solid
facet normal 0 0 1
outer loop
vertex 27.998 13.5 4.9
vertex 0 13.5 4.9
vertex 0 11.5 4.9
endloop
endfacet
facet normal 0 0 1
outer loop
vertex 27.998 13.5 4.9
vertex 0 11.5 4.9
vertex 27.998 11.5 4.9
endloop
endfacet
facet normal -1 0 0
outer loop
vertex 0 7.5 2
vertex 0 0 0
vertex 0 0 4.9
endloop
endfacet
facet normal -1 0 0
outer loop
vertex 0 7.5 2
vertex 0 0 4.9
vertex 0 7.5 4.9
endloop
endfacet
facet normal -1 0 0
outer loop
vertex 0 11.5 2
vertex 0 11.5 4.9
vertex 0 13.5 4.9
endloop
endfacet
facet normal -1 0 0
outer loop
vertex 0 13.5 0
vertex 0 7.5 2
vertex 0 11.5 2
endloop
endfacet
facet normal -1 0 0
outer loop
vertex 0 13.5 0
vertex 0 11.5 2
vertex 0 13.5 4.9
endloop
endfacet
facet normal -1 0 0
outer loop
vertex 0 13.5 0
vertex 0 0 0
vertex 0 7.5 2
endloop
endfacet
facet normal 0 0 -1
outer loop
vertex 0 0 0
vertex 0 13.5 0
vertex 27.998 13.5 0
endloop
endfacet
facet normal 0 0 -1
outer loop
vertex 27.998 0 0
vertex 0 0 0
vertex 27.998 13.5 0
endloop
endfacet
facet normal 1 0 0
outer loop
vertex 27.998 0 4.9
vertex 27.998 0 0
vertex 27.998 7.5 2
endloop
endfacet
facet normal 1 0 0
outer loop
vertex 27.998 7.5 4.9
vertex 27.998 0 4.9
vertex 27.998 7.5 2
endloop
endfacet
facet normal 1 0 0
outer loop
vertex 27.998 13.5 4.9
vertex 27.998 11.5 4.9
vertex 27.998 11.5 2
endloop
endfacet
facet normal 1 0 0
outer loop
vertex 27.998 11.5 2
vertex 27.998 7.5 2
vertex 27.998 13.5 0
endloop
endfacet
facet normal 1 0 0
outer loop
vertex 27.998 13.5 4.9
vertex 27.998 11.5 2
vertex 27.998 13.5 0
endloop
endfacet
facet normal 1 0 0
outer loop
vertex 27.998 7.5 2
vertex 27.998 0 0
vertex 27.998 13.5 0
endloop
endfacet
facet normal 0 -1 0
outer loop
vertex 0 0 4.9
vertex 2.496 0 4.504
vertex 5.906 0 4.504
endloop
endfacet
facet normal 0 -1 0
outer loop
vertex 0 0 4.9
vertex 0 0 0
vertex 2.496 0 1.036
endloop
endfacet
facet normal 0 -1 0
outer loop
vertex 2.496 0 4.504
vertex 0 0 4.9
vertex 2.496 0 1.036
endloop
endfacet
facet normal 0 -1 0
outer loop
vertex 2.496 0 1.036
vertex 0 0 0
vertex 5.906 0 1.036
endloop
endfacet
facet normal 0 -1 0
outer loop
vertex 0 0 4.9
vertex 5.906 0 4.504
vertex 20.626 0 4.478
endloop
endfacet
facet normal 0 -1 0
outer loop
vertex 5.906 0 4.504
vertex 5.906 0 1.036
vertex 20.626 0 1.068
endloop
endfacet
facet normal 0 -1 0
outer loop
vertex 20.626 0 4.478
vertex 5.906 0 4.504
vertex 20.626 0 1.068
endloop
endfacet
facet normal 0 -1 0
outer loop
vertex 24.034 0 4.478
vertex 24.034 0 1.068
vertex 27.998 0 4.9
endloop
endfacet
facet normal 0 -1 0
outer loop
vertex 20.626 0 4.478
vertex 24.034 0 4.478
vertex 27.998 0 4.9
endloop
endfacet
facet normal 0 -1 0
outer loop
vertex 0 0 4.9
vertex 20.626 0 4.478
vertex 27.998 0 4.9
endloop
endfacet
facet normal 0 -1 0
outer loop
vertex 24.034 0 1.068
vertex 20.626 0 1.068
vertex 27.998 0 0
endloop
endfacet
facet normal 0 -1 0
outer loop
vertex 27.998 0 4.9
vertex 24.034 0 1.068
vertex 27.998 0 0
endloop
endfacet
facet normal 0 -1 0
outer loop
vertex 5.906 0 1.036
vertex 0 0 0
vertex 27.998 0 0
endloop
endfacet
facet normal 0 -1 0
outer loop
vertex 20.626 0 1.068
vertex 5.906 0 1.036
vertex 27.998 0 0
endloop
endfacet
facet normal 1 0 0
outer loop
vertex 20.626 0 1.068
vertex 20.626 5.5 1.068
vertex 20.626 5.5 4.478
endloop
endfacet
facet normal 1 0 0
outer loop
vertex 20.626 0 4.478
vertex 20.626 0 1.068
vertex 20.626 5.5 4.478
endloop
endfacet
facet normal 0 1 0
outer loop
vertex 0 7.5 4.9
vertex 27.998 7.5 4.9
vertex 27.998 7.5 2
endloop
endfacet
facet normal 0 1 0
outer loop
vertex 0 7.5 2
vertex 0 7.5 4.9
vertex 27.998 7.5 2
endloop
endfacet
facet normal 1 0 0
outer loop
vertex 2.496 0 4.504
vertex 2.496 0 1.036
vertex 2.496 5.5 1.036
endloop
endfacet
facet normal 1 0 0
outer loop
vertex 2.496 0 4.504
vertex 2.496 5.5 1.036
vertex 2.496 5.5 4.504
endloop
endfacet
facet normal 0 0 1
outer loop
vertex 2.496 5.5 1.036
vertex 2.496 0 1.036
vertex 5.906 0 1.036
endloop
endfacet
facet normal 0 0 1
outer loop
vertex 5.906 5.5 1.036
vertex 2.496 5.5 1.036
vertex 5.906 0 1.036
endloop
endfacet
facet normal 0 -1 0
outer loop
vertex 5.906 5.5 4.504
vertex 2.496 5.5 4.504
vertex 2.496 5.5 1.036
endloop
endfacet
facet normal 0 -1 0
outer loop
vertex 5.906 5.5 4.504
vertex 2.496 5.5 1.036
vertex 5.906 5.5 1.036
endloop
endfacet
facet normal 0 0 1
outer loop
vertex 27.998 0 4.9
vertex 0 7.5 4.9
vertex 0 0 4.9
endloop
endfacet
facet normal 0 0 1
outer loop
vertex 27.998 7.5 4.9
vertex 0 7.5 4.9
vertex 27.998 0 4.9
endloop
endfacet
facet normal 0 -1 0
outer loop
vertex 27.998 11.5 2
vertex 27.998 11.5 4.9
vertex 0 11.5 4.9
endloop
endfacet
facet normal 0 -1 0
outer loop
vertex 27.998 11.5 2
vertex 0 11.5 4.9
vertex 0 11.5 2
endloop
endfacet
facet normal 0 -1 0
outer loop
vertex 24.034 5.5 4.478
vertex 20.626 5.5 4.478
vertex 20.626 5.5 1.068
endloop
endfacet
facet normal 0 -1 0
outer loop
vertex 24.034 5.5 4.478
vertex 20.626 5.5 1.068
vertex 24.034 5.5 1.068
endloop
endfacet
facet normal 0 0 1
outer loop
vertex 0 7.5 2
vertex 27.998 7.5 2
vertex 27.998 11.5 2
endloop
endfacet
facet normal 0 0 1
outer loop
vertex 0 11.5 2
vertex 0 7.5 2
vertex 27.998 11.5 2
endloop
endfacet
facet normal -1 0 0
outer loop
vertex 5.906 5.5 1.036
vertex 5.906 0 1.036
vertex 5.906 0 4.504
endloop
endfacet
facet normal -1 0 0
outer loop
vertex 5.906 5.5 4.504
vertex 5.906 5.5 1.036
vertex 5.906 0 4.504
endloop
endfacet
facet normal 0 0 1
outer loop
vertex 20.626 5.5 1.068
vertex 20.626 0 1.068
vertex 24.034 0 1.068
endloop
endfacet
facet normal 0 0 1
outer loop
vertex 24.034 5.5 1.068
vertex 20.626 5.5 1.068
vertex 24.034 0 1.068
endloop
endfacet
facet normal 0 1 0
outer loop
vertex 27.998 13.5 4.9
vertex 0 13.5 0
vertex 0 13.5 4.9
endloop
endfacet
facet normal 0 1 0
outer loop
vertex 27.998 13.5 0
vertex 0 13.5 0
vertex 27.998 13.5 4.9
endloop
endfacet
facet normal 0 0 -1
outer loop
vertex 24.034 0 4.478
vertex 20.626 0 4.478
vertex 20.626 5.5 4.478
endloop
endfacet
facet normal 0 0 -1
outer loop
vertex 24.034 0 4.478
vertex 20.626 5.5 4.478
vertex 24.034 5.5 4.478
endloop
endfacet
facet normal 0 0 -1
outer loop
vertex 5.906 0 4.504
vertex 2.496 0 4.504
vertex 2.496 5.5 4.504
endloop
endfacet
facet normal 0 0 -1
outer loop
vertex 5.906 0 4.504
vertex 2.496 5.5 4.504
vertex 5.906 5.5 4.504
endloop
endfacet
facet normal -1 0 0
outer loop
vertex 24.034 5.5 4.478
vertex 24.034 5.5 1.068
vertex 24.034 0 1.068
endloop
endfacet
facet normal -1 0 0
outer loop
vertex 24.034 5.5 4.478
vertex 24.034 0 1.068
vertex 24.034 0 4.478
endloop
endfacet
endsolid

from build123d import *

# Parameters (mm, degrees)
SKETCH1_W           = 27.99800038
SKETCH1_H           = 15
BOSS_EXTRUDE1_DEPTH = 4.9
SKETCH3_W           = 3.40799886
SKETCH3_H           = 3.410000155
SKETCH3_W_2         = 2.90799886
SKETCH3_H_2         = 2.910000155
SKETCH3_W_3         = 3.409995615
SKETCH3_H_3         = 3.468000248
SKETCH3_W_4         = 2.909995615
SKETCH3_H_4         = 2.968000248
CUT_EXTRUDE1_DEPTH  = 5.5
SKETCH4_W           = 2.9
SKETCH4_H           = 4
CUT_EXTRUDE2_DEPTH  = 30.5
SKETCH5_W           = 27.99800038
SKETCH5_H           = 4.9
CUT_EXTRUDE3_DEPTH  = 1.5


with BuildPart() as part:
    # Sketch1 → Boss-Extrude1 (new body)
    with BuildSketch(Plane.XY):
        with Locations((13.99900019, 7.5)):
            Rectangle(SKETCH1_W, SKETCH1_H)
    extrude(amount=BOSS_EXTRUDE1_DEPTH)

    # Sketch3 → Cut-Extrude1 (cut)
    # profile 1 of 4: a face of its own
    with BuildSketch(Plane.XZ):
        with Locations((22.329997268, 2.772999986)):
            Rectangle(SKETCH3_W, SKETCH3_H)
        with Locations((22.329997268, 2.772999986)):
            Rectangle(SKETCH3_W_2, SKETCH3_H_2, mode=Mode.SUBTRACT)
    # profile 2 of 4: a face of its own
    with BuildSketch(Plane.XZ):
        with Locations((22.329997268, 2.772999986)):
            Rectangle(SKETCH3_W_2, SKETCH3_H_2)
    # profile 3 of 4: a face of its own
    with BuildSketch(Plane.XZ):
        with Locations((4.200998691, 2.770000137)):
            Rectangle(SKETCH3_W_3, SKETCH3_H_3)
        with Locations((4.200998691, 2.770000137)):
            Rectangle(SKETCH3_W_4, SKETCH3_H_4, mode=Mode.SUBTRACT)
    # profile 4 of 4: a face of its own
    with BuildSketch(Plane.XZ):
        with Locations((4.200998691, 2.770000137)):
            Rectangle(SKETCH3_W_4, SKETCH3_H_4)
    extrude(amount=-CUT_EXTRUDE1_DEPTH, mode=Mode.SUBTRACT)

    # Sketch4 → Cut-Extrude2 (cut)
    with BuildSketch(Plane(origin=(27.99800038, 0, 0), x_dir=(0, 0, -1), z_dir=(1, 0, 0))):
        with Locations((-3.45, 9.5)):
            Rectangle(SKETCH4_W, SKETCH4_H)
    extrude(amount=-CUT_EXTRUDE2_DEPTH, mode=Mode.SUBTRACT)

    # Sketch5 → Cut-Extrude3 (cut)
    with BuildSketch(Plane(origin=(0, 15, 0), x_dir=(1, 0, 0), z_dir=(0, 1, 0))):
        with Locations((13.99900019, -2.45)):
            Rectangle(SKETCH5_W, SKETCH5_H)
    extrude(amount=-CUT_EXTRUDE3_DEPTH, mode=Mode.SUBTRACT)


solid = part.part
